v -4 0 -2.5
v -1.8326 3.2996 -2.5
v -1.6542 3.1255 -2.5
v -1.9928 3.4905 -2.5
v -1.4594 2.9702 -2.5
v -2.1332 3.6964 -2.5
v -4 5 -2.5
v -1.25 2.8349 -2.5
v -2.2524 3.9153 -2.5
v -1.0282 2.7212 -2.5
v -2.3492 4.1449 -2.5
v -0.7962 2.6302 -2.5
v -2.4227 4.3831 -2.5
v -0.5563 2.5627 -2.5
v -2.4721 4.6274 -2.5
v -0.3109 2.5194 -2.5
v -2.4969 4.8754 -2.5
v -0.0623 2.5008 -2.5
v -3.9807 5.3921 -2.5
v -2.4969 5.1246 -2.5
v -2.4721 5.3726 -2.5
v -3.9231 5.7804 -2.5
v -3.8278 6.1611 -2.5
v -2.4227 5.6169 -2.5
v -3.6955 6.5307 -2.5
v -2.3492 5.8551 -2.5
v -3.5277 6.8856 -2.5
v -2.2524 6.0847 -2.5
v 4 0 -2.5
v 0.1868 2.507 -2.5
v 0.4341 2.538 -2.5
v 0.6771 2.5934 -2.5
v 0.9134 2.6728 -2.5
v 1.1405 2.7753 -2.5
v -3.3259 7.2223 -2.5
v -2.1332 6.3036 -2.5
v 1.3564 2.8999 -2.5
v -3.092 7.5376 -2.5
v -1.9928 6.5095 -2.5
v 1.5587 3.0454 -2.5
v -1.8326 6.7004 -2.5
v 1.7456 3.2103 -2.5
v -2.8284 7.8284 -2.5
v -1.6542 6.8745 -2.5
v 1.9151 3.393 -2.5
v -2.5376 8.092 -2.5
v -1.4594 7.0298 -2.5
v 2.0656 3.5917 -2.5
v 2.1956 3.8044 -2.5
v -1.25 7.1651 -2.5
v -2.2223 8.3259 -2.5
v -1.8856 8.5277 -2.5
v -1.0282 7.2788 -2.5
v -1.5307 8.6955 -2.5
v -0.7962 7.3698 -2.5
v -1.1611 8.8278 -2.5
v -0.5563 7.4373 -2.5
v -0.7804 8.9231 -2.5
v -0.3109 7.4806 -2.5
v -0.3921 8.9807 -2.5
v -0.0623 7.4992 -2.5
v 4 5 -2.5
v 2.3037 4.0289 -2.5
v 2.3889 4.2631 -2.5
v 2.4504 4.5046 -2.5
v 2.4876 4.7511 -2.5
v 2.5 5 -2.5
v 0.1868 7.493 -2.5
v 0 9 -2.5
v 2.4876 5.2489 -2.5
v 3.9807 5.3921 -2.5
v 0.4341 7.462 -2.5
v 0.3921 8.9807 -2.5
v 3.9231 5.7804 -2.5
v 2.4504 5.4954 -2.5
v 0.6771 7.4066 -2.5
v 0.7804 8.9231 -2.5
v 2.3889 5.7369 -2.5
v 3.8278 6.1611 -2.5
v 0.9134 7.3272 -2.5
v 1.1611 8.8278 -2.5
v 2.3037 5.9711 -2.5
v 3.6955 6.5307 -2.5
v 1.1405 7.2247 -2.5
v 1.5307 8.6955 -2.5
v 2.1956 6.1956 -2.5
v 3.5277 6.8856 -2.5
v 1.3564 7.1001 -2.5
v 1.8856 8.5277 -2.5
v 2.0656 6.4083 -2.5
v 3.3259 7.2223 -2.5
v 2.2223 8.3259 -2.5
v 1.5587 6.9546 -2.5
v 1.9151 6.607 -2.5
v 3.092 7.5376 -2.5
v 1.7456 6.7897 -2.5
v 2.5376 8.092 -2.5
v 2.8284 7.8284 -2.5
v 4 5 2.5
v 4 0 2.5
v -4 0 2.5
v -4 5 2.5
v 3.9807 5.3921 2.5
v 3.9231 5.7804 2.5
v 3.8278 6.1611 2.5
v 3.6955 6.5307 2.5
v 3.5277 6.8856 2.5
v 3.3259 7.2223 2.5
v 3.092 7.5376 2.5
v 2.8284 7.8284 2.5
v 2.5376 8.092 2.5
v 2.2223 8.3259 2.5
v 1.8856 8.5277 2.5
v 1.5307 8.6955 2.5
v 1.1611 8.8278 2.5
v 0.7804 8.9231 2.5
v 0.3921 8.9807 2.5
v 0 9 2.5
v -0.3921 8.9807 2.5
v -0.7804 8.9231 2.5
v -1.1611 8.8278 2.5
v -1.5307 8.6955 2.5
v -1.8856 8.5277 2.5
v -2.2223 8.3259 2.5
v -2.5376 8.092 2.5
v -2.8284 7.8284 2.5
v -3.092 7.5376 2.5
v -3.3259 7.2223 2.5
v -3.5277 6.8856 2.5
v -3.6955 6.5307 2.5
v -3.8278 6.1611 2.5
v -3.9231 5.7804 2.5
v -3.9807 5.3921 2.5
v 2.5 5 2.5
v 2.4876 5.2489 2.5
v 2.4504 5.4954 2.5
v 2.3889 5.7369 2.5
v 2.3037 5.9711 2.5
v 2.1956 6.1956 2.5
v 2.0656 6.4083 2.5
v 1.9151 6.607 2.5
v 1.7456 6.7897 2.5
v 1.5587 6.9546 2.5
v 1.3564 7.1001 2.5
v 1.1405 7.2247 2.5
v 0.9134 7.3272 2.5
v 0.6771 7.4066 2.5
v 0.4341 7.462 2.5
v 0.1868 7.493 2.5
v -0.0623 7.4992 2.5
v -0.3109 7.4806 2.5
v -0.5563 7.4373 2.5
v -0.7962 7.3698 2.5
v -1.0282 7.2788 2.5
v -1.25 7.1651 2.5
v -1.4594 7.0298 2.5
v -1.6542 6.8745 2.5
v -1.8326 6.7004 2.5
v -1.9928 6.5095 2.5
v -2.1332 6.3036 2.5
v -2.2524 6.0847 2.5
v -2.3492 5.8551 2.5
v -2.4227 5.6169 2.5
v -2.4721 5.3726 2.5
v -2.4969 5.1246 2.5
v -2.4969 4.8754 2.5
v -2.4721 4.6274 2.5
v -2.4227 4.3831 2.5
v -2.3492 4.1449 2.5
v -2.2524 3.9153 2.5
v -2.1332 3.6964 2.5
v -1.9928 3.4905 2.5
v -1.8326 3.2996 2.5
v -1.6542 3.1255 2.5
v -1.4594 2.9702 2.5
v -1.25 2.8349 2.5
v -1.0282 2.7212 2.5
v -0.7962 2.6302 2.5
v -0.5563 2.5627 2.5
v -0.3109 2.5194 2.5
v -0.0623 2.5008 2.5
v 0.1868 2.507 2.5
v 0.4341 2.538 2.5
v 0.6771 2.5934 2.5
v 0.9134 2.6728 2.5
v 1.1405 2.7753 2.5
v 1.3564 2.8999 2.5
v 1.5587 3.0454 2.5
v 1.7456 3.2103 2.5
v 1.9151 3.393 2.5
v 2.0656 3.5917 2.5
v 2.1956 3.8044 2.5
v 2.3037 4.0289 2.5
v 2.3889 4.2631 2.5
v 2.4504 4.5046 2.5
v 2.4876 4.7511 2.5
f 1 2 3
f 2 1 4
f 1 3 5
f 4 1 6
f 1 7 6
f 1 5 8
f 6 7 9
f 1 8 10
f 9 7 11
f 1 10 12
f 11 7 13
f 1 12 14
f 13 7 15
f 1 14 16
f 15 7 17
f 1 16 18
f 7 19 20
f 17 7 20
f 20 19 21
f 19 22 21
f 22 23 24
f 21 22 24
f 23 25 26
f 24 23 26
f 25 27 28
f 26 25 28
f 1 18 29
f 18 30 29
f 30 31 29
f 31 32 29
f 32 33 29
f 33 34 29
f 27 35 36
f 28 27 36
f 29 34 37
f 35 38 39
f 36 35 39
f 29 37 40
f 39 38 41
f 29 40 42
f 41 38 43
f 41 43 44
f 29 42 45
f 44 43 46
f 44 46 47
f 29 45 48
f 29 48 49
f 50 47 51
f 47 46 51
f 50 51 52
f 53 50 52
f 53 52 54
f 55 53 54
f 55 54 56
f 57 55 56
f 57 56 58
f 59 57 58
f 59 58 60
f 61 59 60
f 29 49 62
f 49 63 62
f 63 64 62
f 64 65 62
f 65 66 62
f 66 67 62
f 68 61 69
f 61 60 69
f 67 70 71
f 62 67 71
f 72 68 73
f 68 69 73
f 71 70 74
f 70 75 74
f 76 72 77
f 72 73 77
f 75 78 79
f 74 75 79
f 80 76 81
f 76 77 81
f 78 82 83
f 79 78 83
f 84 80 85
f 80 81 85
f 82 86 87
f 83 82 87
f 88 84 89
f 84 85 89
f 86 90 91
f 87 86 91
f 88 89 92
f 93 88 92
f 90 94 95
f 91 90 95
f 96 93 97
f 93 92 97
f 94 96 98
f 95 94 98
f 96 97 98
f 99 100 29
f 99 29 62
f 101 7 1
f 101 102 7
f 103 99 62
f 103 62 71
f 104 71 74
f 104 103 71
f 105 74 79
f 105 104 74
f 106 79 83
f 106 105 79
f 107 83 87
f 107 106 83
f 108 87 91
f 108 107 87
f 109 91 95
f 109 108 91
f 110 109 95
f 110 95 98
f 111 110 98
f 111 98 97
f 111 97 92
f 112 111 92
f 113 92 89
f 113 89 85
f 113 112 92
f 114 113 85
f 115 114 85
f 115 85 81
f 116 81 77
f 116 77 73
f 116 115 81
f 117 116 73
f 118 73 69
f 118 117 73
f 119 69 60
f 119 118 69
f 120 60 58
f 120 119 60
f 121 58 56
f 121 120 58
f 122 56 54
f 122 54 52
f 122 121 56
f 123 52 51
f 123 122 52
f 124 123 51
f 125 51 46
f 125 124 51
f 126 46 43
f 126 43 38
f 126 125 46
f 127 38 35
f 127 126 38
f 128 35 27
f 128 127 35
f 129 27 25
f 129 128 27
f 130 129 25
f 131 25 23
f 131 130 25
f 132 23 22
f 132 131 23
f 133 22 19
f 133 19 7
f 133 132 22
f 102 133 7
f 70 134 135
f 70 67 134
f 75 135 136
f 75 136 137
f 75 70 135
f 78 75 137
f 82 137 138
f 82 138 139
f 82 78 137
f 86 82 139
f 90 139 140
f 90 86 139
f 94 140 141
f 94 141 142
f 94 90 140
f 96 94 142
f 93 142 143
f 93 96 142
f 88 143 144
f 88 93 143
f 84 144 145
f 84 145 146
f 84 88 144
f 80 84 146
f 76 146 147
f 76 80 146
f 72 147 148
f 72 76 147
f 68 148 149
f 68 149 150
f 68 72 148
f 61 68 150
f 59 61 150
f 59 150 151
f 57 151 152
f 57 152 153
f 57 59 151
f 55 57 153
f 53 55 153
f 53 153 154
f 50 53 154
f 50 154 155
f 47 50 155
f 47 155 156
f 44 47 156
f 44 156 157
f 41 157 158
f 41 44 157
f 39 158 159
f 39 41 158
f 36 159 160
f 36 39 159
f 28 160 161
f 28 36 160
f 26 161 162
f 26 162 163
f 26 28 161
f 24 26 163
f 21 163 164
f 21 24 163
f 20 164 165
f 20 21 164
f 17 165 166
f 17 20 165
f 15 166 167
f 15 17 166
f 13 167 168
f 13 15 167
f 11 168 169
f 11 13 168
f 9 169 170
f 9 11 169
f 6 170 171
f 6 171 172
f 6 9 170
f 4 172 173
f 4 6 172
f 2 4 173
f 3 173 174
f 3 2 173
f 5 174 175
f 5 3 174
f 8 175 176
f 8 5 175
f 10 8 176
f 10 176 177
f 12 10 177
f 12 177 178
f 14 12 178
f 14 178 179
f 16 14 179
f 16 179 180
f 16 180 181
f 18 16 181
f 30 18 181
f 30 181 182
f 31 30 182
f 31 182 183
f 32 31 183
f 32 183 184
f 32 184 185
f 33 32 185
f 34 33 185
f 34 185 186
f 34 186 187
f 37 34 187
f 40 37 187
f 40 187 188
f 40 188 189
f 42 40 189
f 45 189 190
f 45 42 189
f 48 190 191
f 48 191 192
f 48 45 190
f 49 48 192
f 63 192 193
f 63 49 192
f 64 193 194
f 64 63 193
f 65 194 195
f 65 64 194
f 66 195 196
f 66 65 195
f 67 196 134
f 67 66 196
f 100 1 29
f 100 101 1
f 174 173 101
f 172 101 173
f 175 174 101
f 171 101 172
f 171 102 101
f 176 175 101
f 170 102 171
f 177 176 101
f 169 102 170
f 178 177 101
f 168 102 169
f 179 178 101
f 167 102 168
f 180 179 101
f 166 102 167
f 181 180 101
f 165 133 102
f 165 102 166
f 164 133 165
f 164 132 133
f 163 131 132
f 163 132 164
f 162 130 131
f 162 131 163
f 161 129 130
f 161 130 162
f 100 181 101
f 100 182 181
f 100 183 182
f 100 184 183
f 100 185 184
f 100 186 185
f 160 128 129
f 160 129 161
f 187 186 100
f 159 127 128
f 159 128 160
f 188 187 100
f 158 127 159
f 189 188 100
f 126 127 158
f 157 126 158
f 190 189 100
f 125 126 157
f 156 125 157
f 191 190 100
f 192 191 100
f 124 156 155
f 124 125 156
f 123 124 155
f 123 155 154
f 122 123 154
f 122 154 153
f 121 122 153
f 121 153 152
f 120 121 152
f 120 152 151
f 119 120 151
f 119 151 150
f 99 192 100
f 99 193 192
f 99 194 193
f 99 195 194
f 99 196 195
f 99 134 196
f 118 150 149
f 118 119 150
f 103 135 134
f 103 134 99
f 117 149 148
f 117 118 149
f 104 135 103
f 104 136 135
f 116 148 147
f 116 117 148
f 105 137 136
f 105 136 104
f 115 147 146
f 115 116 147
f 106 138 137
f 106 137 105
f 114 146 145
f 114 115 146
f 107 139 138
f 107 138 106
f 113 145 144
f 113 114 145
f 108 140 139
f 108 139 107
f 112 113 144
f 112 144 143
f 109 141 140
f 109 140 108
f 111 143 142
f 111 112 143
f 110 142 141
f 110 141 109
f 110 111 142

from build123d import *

# Parameters (mm, degrees)
SKETCH1_R           = 2.5
BOSS_EXTRUDE1_DEPTH = 2.5


with BuildPart() as part:
    # Sketch1 → Boss-Extrude1 (new, symmetric)
    with BuildSketch(Plane.XY):
        with BuildLine():
            Line((-4, 0), (4, 0))
            Line((4, 0), (4, 5))
            ThreePointArc((4, 5), (0, 9), (-4, 5))
            Line((-4, 5), (-4, 0))
        make_face()
        with Locations((0, 5)):
            Circle(SKETCH1_R, mode=Mode.SUBTRACT)
    extrude(amount=BOSS_EXTRUDE1_DEPTH, both=True)


solid = part.part
